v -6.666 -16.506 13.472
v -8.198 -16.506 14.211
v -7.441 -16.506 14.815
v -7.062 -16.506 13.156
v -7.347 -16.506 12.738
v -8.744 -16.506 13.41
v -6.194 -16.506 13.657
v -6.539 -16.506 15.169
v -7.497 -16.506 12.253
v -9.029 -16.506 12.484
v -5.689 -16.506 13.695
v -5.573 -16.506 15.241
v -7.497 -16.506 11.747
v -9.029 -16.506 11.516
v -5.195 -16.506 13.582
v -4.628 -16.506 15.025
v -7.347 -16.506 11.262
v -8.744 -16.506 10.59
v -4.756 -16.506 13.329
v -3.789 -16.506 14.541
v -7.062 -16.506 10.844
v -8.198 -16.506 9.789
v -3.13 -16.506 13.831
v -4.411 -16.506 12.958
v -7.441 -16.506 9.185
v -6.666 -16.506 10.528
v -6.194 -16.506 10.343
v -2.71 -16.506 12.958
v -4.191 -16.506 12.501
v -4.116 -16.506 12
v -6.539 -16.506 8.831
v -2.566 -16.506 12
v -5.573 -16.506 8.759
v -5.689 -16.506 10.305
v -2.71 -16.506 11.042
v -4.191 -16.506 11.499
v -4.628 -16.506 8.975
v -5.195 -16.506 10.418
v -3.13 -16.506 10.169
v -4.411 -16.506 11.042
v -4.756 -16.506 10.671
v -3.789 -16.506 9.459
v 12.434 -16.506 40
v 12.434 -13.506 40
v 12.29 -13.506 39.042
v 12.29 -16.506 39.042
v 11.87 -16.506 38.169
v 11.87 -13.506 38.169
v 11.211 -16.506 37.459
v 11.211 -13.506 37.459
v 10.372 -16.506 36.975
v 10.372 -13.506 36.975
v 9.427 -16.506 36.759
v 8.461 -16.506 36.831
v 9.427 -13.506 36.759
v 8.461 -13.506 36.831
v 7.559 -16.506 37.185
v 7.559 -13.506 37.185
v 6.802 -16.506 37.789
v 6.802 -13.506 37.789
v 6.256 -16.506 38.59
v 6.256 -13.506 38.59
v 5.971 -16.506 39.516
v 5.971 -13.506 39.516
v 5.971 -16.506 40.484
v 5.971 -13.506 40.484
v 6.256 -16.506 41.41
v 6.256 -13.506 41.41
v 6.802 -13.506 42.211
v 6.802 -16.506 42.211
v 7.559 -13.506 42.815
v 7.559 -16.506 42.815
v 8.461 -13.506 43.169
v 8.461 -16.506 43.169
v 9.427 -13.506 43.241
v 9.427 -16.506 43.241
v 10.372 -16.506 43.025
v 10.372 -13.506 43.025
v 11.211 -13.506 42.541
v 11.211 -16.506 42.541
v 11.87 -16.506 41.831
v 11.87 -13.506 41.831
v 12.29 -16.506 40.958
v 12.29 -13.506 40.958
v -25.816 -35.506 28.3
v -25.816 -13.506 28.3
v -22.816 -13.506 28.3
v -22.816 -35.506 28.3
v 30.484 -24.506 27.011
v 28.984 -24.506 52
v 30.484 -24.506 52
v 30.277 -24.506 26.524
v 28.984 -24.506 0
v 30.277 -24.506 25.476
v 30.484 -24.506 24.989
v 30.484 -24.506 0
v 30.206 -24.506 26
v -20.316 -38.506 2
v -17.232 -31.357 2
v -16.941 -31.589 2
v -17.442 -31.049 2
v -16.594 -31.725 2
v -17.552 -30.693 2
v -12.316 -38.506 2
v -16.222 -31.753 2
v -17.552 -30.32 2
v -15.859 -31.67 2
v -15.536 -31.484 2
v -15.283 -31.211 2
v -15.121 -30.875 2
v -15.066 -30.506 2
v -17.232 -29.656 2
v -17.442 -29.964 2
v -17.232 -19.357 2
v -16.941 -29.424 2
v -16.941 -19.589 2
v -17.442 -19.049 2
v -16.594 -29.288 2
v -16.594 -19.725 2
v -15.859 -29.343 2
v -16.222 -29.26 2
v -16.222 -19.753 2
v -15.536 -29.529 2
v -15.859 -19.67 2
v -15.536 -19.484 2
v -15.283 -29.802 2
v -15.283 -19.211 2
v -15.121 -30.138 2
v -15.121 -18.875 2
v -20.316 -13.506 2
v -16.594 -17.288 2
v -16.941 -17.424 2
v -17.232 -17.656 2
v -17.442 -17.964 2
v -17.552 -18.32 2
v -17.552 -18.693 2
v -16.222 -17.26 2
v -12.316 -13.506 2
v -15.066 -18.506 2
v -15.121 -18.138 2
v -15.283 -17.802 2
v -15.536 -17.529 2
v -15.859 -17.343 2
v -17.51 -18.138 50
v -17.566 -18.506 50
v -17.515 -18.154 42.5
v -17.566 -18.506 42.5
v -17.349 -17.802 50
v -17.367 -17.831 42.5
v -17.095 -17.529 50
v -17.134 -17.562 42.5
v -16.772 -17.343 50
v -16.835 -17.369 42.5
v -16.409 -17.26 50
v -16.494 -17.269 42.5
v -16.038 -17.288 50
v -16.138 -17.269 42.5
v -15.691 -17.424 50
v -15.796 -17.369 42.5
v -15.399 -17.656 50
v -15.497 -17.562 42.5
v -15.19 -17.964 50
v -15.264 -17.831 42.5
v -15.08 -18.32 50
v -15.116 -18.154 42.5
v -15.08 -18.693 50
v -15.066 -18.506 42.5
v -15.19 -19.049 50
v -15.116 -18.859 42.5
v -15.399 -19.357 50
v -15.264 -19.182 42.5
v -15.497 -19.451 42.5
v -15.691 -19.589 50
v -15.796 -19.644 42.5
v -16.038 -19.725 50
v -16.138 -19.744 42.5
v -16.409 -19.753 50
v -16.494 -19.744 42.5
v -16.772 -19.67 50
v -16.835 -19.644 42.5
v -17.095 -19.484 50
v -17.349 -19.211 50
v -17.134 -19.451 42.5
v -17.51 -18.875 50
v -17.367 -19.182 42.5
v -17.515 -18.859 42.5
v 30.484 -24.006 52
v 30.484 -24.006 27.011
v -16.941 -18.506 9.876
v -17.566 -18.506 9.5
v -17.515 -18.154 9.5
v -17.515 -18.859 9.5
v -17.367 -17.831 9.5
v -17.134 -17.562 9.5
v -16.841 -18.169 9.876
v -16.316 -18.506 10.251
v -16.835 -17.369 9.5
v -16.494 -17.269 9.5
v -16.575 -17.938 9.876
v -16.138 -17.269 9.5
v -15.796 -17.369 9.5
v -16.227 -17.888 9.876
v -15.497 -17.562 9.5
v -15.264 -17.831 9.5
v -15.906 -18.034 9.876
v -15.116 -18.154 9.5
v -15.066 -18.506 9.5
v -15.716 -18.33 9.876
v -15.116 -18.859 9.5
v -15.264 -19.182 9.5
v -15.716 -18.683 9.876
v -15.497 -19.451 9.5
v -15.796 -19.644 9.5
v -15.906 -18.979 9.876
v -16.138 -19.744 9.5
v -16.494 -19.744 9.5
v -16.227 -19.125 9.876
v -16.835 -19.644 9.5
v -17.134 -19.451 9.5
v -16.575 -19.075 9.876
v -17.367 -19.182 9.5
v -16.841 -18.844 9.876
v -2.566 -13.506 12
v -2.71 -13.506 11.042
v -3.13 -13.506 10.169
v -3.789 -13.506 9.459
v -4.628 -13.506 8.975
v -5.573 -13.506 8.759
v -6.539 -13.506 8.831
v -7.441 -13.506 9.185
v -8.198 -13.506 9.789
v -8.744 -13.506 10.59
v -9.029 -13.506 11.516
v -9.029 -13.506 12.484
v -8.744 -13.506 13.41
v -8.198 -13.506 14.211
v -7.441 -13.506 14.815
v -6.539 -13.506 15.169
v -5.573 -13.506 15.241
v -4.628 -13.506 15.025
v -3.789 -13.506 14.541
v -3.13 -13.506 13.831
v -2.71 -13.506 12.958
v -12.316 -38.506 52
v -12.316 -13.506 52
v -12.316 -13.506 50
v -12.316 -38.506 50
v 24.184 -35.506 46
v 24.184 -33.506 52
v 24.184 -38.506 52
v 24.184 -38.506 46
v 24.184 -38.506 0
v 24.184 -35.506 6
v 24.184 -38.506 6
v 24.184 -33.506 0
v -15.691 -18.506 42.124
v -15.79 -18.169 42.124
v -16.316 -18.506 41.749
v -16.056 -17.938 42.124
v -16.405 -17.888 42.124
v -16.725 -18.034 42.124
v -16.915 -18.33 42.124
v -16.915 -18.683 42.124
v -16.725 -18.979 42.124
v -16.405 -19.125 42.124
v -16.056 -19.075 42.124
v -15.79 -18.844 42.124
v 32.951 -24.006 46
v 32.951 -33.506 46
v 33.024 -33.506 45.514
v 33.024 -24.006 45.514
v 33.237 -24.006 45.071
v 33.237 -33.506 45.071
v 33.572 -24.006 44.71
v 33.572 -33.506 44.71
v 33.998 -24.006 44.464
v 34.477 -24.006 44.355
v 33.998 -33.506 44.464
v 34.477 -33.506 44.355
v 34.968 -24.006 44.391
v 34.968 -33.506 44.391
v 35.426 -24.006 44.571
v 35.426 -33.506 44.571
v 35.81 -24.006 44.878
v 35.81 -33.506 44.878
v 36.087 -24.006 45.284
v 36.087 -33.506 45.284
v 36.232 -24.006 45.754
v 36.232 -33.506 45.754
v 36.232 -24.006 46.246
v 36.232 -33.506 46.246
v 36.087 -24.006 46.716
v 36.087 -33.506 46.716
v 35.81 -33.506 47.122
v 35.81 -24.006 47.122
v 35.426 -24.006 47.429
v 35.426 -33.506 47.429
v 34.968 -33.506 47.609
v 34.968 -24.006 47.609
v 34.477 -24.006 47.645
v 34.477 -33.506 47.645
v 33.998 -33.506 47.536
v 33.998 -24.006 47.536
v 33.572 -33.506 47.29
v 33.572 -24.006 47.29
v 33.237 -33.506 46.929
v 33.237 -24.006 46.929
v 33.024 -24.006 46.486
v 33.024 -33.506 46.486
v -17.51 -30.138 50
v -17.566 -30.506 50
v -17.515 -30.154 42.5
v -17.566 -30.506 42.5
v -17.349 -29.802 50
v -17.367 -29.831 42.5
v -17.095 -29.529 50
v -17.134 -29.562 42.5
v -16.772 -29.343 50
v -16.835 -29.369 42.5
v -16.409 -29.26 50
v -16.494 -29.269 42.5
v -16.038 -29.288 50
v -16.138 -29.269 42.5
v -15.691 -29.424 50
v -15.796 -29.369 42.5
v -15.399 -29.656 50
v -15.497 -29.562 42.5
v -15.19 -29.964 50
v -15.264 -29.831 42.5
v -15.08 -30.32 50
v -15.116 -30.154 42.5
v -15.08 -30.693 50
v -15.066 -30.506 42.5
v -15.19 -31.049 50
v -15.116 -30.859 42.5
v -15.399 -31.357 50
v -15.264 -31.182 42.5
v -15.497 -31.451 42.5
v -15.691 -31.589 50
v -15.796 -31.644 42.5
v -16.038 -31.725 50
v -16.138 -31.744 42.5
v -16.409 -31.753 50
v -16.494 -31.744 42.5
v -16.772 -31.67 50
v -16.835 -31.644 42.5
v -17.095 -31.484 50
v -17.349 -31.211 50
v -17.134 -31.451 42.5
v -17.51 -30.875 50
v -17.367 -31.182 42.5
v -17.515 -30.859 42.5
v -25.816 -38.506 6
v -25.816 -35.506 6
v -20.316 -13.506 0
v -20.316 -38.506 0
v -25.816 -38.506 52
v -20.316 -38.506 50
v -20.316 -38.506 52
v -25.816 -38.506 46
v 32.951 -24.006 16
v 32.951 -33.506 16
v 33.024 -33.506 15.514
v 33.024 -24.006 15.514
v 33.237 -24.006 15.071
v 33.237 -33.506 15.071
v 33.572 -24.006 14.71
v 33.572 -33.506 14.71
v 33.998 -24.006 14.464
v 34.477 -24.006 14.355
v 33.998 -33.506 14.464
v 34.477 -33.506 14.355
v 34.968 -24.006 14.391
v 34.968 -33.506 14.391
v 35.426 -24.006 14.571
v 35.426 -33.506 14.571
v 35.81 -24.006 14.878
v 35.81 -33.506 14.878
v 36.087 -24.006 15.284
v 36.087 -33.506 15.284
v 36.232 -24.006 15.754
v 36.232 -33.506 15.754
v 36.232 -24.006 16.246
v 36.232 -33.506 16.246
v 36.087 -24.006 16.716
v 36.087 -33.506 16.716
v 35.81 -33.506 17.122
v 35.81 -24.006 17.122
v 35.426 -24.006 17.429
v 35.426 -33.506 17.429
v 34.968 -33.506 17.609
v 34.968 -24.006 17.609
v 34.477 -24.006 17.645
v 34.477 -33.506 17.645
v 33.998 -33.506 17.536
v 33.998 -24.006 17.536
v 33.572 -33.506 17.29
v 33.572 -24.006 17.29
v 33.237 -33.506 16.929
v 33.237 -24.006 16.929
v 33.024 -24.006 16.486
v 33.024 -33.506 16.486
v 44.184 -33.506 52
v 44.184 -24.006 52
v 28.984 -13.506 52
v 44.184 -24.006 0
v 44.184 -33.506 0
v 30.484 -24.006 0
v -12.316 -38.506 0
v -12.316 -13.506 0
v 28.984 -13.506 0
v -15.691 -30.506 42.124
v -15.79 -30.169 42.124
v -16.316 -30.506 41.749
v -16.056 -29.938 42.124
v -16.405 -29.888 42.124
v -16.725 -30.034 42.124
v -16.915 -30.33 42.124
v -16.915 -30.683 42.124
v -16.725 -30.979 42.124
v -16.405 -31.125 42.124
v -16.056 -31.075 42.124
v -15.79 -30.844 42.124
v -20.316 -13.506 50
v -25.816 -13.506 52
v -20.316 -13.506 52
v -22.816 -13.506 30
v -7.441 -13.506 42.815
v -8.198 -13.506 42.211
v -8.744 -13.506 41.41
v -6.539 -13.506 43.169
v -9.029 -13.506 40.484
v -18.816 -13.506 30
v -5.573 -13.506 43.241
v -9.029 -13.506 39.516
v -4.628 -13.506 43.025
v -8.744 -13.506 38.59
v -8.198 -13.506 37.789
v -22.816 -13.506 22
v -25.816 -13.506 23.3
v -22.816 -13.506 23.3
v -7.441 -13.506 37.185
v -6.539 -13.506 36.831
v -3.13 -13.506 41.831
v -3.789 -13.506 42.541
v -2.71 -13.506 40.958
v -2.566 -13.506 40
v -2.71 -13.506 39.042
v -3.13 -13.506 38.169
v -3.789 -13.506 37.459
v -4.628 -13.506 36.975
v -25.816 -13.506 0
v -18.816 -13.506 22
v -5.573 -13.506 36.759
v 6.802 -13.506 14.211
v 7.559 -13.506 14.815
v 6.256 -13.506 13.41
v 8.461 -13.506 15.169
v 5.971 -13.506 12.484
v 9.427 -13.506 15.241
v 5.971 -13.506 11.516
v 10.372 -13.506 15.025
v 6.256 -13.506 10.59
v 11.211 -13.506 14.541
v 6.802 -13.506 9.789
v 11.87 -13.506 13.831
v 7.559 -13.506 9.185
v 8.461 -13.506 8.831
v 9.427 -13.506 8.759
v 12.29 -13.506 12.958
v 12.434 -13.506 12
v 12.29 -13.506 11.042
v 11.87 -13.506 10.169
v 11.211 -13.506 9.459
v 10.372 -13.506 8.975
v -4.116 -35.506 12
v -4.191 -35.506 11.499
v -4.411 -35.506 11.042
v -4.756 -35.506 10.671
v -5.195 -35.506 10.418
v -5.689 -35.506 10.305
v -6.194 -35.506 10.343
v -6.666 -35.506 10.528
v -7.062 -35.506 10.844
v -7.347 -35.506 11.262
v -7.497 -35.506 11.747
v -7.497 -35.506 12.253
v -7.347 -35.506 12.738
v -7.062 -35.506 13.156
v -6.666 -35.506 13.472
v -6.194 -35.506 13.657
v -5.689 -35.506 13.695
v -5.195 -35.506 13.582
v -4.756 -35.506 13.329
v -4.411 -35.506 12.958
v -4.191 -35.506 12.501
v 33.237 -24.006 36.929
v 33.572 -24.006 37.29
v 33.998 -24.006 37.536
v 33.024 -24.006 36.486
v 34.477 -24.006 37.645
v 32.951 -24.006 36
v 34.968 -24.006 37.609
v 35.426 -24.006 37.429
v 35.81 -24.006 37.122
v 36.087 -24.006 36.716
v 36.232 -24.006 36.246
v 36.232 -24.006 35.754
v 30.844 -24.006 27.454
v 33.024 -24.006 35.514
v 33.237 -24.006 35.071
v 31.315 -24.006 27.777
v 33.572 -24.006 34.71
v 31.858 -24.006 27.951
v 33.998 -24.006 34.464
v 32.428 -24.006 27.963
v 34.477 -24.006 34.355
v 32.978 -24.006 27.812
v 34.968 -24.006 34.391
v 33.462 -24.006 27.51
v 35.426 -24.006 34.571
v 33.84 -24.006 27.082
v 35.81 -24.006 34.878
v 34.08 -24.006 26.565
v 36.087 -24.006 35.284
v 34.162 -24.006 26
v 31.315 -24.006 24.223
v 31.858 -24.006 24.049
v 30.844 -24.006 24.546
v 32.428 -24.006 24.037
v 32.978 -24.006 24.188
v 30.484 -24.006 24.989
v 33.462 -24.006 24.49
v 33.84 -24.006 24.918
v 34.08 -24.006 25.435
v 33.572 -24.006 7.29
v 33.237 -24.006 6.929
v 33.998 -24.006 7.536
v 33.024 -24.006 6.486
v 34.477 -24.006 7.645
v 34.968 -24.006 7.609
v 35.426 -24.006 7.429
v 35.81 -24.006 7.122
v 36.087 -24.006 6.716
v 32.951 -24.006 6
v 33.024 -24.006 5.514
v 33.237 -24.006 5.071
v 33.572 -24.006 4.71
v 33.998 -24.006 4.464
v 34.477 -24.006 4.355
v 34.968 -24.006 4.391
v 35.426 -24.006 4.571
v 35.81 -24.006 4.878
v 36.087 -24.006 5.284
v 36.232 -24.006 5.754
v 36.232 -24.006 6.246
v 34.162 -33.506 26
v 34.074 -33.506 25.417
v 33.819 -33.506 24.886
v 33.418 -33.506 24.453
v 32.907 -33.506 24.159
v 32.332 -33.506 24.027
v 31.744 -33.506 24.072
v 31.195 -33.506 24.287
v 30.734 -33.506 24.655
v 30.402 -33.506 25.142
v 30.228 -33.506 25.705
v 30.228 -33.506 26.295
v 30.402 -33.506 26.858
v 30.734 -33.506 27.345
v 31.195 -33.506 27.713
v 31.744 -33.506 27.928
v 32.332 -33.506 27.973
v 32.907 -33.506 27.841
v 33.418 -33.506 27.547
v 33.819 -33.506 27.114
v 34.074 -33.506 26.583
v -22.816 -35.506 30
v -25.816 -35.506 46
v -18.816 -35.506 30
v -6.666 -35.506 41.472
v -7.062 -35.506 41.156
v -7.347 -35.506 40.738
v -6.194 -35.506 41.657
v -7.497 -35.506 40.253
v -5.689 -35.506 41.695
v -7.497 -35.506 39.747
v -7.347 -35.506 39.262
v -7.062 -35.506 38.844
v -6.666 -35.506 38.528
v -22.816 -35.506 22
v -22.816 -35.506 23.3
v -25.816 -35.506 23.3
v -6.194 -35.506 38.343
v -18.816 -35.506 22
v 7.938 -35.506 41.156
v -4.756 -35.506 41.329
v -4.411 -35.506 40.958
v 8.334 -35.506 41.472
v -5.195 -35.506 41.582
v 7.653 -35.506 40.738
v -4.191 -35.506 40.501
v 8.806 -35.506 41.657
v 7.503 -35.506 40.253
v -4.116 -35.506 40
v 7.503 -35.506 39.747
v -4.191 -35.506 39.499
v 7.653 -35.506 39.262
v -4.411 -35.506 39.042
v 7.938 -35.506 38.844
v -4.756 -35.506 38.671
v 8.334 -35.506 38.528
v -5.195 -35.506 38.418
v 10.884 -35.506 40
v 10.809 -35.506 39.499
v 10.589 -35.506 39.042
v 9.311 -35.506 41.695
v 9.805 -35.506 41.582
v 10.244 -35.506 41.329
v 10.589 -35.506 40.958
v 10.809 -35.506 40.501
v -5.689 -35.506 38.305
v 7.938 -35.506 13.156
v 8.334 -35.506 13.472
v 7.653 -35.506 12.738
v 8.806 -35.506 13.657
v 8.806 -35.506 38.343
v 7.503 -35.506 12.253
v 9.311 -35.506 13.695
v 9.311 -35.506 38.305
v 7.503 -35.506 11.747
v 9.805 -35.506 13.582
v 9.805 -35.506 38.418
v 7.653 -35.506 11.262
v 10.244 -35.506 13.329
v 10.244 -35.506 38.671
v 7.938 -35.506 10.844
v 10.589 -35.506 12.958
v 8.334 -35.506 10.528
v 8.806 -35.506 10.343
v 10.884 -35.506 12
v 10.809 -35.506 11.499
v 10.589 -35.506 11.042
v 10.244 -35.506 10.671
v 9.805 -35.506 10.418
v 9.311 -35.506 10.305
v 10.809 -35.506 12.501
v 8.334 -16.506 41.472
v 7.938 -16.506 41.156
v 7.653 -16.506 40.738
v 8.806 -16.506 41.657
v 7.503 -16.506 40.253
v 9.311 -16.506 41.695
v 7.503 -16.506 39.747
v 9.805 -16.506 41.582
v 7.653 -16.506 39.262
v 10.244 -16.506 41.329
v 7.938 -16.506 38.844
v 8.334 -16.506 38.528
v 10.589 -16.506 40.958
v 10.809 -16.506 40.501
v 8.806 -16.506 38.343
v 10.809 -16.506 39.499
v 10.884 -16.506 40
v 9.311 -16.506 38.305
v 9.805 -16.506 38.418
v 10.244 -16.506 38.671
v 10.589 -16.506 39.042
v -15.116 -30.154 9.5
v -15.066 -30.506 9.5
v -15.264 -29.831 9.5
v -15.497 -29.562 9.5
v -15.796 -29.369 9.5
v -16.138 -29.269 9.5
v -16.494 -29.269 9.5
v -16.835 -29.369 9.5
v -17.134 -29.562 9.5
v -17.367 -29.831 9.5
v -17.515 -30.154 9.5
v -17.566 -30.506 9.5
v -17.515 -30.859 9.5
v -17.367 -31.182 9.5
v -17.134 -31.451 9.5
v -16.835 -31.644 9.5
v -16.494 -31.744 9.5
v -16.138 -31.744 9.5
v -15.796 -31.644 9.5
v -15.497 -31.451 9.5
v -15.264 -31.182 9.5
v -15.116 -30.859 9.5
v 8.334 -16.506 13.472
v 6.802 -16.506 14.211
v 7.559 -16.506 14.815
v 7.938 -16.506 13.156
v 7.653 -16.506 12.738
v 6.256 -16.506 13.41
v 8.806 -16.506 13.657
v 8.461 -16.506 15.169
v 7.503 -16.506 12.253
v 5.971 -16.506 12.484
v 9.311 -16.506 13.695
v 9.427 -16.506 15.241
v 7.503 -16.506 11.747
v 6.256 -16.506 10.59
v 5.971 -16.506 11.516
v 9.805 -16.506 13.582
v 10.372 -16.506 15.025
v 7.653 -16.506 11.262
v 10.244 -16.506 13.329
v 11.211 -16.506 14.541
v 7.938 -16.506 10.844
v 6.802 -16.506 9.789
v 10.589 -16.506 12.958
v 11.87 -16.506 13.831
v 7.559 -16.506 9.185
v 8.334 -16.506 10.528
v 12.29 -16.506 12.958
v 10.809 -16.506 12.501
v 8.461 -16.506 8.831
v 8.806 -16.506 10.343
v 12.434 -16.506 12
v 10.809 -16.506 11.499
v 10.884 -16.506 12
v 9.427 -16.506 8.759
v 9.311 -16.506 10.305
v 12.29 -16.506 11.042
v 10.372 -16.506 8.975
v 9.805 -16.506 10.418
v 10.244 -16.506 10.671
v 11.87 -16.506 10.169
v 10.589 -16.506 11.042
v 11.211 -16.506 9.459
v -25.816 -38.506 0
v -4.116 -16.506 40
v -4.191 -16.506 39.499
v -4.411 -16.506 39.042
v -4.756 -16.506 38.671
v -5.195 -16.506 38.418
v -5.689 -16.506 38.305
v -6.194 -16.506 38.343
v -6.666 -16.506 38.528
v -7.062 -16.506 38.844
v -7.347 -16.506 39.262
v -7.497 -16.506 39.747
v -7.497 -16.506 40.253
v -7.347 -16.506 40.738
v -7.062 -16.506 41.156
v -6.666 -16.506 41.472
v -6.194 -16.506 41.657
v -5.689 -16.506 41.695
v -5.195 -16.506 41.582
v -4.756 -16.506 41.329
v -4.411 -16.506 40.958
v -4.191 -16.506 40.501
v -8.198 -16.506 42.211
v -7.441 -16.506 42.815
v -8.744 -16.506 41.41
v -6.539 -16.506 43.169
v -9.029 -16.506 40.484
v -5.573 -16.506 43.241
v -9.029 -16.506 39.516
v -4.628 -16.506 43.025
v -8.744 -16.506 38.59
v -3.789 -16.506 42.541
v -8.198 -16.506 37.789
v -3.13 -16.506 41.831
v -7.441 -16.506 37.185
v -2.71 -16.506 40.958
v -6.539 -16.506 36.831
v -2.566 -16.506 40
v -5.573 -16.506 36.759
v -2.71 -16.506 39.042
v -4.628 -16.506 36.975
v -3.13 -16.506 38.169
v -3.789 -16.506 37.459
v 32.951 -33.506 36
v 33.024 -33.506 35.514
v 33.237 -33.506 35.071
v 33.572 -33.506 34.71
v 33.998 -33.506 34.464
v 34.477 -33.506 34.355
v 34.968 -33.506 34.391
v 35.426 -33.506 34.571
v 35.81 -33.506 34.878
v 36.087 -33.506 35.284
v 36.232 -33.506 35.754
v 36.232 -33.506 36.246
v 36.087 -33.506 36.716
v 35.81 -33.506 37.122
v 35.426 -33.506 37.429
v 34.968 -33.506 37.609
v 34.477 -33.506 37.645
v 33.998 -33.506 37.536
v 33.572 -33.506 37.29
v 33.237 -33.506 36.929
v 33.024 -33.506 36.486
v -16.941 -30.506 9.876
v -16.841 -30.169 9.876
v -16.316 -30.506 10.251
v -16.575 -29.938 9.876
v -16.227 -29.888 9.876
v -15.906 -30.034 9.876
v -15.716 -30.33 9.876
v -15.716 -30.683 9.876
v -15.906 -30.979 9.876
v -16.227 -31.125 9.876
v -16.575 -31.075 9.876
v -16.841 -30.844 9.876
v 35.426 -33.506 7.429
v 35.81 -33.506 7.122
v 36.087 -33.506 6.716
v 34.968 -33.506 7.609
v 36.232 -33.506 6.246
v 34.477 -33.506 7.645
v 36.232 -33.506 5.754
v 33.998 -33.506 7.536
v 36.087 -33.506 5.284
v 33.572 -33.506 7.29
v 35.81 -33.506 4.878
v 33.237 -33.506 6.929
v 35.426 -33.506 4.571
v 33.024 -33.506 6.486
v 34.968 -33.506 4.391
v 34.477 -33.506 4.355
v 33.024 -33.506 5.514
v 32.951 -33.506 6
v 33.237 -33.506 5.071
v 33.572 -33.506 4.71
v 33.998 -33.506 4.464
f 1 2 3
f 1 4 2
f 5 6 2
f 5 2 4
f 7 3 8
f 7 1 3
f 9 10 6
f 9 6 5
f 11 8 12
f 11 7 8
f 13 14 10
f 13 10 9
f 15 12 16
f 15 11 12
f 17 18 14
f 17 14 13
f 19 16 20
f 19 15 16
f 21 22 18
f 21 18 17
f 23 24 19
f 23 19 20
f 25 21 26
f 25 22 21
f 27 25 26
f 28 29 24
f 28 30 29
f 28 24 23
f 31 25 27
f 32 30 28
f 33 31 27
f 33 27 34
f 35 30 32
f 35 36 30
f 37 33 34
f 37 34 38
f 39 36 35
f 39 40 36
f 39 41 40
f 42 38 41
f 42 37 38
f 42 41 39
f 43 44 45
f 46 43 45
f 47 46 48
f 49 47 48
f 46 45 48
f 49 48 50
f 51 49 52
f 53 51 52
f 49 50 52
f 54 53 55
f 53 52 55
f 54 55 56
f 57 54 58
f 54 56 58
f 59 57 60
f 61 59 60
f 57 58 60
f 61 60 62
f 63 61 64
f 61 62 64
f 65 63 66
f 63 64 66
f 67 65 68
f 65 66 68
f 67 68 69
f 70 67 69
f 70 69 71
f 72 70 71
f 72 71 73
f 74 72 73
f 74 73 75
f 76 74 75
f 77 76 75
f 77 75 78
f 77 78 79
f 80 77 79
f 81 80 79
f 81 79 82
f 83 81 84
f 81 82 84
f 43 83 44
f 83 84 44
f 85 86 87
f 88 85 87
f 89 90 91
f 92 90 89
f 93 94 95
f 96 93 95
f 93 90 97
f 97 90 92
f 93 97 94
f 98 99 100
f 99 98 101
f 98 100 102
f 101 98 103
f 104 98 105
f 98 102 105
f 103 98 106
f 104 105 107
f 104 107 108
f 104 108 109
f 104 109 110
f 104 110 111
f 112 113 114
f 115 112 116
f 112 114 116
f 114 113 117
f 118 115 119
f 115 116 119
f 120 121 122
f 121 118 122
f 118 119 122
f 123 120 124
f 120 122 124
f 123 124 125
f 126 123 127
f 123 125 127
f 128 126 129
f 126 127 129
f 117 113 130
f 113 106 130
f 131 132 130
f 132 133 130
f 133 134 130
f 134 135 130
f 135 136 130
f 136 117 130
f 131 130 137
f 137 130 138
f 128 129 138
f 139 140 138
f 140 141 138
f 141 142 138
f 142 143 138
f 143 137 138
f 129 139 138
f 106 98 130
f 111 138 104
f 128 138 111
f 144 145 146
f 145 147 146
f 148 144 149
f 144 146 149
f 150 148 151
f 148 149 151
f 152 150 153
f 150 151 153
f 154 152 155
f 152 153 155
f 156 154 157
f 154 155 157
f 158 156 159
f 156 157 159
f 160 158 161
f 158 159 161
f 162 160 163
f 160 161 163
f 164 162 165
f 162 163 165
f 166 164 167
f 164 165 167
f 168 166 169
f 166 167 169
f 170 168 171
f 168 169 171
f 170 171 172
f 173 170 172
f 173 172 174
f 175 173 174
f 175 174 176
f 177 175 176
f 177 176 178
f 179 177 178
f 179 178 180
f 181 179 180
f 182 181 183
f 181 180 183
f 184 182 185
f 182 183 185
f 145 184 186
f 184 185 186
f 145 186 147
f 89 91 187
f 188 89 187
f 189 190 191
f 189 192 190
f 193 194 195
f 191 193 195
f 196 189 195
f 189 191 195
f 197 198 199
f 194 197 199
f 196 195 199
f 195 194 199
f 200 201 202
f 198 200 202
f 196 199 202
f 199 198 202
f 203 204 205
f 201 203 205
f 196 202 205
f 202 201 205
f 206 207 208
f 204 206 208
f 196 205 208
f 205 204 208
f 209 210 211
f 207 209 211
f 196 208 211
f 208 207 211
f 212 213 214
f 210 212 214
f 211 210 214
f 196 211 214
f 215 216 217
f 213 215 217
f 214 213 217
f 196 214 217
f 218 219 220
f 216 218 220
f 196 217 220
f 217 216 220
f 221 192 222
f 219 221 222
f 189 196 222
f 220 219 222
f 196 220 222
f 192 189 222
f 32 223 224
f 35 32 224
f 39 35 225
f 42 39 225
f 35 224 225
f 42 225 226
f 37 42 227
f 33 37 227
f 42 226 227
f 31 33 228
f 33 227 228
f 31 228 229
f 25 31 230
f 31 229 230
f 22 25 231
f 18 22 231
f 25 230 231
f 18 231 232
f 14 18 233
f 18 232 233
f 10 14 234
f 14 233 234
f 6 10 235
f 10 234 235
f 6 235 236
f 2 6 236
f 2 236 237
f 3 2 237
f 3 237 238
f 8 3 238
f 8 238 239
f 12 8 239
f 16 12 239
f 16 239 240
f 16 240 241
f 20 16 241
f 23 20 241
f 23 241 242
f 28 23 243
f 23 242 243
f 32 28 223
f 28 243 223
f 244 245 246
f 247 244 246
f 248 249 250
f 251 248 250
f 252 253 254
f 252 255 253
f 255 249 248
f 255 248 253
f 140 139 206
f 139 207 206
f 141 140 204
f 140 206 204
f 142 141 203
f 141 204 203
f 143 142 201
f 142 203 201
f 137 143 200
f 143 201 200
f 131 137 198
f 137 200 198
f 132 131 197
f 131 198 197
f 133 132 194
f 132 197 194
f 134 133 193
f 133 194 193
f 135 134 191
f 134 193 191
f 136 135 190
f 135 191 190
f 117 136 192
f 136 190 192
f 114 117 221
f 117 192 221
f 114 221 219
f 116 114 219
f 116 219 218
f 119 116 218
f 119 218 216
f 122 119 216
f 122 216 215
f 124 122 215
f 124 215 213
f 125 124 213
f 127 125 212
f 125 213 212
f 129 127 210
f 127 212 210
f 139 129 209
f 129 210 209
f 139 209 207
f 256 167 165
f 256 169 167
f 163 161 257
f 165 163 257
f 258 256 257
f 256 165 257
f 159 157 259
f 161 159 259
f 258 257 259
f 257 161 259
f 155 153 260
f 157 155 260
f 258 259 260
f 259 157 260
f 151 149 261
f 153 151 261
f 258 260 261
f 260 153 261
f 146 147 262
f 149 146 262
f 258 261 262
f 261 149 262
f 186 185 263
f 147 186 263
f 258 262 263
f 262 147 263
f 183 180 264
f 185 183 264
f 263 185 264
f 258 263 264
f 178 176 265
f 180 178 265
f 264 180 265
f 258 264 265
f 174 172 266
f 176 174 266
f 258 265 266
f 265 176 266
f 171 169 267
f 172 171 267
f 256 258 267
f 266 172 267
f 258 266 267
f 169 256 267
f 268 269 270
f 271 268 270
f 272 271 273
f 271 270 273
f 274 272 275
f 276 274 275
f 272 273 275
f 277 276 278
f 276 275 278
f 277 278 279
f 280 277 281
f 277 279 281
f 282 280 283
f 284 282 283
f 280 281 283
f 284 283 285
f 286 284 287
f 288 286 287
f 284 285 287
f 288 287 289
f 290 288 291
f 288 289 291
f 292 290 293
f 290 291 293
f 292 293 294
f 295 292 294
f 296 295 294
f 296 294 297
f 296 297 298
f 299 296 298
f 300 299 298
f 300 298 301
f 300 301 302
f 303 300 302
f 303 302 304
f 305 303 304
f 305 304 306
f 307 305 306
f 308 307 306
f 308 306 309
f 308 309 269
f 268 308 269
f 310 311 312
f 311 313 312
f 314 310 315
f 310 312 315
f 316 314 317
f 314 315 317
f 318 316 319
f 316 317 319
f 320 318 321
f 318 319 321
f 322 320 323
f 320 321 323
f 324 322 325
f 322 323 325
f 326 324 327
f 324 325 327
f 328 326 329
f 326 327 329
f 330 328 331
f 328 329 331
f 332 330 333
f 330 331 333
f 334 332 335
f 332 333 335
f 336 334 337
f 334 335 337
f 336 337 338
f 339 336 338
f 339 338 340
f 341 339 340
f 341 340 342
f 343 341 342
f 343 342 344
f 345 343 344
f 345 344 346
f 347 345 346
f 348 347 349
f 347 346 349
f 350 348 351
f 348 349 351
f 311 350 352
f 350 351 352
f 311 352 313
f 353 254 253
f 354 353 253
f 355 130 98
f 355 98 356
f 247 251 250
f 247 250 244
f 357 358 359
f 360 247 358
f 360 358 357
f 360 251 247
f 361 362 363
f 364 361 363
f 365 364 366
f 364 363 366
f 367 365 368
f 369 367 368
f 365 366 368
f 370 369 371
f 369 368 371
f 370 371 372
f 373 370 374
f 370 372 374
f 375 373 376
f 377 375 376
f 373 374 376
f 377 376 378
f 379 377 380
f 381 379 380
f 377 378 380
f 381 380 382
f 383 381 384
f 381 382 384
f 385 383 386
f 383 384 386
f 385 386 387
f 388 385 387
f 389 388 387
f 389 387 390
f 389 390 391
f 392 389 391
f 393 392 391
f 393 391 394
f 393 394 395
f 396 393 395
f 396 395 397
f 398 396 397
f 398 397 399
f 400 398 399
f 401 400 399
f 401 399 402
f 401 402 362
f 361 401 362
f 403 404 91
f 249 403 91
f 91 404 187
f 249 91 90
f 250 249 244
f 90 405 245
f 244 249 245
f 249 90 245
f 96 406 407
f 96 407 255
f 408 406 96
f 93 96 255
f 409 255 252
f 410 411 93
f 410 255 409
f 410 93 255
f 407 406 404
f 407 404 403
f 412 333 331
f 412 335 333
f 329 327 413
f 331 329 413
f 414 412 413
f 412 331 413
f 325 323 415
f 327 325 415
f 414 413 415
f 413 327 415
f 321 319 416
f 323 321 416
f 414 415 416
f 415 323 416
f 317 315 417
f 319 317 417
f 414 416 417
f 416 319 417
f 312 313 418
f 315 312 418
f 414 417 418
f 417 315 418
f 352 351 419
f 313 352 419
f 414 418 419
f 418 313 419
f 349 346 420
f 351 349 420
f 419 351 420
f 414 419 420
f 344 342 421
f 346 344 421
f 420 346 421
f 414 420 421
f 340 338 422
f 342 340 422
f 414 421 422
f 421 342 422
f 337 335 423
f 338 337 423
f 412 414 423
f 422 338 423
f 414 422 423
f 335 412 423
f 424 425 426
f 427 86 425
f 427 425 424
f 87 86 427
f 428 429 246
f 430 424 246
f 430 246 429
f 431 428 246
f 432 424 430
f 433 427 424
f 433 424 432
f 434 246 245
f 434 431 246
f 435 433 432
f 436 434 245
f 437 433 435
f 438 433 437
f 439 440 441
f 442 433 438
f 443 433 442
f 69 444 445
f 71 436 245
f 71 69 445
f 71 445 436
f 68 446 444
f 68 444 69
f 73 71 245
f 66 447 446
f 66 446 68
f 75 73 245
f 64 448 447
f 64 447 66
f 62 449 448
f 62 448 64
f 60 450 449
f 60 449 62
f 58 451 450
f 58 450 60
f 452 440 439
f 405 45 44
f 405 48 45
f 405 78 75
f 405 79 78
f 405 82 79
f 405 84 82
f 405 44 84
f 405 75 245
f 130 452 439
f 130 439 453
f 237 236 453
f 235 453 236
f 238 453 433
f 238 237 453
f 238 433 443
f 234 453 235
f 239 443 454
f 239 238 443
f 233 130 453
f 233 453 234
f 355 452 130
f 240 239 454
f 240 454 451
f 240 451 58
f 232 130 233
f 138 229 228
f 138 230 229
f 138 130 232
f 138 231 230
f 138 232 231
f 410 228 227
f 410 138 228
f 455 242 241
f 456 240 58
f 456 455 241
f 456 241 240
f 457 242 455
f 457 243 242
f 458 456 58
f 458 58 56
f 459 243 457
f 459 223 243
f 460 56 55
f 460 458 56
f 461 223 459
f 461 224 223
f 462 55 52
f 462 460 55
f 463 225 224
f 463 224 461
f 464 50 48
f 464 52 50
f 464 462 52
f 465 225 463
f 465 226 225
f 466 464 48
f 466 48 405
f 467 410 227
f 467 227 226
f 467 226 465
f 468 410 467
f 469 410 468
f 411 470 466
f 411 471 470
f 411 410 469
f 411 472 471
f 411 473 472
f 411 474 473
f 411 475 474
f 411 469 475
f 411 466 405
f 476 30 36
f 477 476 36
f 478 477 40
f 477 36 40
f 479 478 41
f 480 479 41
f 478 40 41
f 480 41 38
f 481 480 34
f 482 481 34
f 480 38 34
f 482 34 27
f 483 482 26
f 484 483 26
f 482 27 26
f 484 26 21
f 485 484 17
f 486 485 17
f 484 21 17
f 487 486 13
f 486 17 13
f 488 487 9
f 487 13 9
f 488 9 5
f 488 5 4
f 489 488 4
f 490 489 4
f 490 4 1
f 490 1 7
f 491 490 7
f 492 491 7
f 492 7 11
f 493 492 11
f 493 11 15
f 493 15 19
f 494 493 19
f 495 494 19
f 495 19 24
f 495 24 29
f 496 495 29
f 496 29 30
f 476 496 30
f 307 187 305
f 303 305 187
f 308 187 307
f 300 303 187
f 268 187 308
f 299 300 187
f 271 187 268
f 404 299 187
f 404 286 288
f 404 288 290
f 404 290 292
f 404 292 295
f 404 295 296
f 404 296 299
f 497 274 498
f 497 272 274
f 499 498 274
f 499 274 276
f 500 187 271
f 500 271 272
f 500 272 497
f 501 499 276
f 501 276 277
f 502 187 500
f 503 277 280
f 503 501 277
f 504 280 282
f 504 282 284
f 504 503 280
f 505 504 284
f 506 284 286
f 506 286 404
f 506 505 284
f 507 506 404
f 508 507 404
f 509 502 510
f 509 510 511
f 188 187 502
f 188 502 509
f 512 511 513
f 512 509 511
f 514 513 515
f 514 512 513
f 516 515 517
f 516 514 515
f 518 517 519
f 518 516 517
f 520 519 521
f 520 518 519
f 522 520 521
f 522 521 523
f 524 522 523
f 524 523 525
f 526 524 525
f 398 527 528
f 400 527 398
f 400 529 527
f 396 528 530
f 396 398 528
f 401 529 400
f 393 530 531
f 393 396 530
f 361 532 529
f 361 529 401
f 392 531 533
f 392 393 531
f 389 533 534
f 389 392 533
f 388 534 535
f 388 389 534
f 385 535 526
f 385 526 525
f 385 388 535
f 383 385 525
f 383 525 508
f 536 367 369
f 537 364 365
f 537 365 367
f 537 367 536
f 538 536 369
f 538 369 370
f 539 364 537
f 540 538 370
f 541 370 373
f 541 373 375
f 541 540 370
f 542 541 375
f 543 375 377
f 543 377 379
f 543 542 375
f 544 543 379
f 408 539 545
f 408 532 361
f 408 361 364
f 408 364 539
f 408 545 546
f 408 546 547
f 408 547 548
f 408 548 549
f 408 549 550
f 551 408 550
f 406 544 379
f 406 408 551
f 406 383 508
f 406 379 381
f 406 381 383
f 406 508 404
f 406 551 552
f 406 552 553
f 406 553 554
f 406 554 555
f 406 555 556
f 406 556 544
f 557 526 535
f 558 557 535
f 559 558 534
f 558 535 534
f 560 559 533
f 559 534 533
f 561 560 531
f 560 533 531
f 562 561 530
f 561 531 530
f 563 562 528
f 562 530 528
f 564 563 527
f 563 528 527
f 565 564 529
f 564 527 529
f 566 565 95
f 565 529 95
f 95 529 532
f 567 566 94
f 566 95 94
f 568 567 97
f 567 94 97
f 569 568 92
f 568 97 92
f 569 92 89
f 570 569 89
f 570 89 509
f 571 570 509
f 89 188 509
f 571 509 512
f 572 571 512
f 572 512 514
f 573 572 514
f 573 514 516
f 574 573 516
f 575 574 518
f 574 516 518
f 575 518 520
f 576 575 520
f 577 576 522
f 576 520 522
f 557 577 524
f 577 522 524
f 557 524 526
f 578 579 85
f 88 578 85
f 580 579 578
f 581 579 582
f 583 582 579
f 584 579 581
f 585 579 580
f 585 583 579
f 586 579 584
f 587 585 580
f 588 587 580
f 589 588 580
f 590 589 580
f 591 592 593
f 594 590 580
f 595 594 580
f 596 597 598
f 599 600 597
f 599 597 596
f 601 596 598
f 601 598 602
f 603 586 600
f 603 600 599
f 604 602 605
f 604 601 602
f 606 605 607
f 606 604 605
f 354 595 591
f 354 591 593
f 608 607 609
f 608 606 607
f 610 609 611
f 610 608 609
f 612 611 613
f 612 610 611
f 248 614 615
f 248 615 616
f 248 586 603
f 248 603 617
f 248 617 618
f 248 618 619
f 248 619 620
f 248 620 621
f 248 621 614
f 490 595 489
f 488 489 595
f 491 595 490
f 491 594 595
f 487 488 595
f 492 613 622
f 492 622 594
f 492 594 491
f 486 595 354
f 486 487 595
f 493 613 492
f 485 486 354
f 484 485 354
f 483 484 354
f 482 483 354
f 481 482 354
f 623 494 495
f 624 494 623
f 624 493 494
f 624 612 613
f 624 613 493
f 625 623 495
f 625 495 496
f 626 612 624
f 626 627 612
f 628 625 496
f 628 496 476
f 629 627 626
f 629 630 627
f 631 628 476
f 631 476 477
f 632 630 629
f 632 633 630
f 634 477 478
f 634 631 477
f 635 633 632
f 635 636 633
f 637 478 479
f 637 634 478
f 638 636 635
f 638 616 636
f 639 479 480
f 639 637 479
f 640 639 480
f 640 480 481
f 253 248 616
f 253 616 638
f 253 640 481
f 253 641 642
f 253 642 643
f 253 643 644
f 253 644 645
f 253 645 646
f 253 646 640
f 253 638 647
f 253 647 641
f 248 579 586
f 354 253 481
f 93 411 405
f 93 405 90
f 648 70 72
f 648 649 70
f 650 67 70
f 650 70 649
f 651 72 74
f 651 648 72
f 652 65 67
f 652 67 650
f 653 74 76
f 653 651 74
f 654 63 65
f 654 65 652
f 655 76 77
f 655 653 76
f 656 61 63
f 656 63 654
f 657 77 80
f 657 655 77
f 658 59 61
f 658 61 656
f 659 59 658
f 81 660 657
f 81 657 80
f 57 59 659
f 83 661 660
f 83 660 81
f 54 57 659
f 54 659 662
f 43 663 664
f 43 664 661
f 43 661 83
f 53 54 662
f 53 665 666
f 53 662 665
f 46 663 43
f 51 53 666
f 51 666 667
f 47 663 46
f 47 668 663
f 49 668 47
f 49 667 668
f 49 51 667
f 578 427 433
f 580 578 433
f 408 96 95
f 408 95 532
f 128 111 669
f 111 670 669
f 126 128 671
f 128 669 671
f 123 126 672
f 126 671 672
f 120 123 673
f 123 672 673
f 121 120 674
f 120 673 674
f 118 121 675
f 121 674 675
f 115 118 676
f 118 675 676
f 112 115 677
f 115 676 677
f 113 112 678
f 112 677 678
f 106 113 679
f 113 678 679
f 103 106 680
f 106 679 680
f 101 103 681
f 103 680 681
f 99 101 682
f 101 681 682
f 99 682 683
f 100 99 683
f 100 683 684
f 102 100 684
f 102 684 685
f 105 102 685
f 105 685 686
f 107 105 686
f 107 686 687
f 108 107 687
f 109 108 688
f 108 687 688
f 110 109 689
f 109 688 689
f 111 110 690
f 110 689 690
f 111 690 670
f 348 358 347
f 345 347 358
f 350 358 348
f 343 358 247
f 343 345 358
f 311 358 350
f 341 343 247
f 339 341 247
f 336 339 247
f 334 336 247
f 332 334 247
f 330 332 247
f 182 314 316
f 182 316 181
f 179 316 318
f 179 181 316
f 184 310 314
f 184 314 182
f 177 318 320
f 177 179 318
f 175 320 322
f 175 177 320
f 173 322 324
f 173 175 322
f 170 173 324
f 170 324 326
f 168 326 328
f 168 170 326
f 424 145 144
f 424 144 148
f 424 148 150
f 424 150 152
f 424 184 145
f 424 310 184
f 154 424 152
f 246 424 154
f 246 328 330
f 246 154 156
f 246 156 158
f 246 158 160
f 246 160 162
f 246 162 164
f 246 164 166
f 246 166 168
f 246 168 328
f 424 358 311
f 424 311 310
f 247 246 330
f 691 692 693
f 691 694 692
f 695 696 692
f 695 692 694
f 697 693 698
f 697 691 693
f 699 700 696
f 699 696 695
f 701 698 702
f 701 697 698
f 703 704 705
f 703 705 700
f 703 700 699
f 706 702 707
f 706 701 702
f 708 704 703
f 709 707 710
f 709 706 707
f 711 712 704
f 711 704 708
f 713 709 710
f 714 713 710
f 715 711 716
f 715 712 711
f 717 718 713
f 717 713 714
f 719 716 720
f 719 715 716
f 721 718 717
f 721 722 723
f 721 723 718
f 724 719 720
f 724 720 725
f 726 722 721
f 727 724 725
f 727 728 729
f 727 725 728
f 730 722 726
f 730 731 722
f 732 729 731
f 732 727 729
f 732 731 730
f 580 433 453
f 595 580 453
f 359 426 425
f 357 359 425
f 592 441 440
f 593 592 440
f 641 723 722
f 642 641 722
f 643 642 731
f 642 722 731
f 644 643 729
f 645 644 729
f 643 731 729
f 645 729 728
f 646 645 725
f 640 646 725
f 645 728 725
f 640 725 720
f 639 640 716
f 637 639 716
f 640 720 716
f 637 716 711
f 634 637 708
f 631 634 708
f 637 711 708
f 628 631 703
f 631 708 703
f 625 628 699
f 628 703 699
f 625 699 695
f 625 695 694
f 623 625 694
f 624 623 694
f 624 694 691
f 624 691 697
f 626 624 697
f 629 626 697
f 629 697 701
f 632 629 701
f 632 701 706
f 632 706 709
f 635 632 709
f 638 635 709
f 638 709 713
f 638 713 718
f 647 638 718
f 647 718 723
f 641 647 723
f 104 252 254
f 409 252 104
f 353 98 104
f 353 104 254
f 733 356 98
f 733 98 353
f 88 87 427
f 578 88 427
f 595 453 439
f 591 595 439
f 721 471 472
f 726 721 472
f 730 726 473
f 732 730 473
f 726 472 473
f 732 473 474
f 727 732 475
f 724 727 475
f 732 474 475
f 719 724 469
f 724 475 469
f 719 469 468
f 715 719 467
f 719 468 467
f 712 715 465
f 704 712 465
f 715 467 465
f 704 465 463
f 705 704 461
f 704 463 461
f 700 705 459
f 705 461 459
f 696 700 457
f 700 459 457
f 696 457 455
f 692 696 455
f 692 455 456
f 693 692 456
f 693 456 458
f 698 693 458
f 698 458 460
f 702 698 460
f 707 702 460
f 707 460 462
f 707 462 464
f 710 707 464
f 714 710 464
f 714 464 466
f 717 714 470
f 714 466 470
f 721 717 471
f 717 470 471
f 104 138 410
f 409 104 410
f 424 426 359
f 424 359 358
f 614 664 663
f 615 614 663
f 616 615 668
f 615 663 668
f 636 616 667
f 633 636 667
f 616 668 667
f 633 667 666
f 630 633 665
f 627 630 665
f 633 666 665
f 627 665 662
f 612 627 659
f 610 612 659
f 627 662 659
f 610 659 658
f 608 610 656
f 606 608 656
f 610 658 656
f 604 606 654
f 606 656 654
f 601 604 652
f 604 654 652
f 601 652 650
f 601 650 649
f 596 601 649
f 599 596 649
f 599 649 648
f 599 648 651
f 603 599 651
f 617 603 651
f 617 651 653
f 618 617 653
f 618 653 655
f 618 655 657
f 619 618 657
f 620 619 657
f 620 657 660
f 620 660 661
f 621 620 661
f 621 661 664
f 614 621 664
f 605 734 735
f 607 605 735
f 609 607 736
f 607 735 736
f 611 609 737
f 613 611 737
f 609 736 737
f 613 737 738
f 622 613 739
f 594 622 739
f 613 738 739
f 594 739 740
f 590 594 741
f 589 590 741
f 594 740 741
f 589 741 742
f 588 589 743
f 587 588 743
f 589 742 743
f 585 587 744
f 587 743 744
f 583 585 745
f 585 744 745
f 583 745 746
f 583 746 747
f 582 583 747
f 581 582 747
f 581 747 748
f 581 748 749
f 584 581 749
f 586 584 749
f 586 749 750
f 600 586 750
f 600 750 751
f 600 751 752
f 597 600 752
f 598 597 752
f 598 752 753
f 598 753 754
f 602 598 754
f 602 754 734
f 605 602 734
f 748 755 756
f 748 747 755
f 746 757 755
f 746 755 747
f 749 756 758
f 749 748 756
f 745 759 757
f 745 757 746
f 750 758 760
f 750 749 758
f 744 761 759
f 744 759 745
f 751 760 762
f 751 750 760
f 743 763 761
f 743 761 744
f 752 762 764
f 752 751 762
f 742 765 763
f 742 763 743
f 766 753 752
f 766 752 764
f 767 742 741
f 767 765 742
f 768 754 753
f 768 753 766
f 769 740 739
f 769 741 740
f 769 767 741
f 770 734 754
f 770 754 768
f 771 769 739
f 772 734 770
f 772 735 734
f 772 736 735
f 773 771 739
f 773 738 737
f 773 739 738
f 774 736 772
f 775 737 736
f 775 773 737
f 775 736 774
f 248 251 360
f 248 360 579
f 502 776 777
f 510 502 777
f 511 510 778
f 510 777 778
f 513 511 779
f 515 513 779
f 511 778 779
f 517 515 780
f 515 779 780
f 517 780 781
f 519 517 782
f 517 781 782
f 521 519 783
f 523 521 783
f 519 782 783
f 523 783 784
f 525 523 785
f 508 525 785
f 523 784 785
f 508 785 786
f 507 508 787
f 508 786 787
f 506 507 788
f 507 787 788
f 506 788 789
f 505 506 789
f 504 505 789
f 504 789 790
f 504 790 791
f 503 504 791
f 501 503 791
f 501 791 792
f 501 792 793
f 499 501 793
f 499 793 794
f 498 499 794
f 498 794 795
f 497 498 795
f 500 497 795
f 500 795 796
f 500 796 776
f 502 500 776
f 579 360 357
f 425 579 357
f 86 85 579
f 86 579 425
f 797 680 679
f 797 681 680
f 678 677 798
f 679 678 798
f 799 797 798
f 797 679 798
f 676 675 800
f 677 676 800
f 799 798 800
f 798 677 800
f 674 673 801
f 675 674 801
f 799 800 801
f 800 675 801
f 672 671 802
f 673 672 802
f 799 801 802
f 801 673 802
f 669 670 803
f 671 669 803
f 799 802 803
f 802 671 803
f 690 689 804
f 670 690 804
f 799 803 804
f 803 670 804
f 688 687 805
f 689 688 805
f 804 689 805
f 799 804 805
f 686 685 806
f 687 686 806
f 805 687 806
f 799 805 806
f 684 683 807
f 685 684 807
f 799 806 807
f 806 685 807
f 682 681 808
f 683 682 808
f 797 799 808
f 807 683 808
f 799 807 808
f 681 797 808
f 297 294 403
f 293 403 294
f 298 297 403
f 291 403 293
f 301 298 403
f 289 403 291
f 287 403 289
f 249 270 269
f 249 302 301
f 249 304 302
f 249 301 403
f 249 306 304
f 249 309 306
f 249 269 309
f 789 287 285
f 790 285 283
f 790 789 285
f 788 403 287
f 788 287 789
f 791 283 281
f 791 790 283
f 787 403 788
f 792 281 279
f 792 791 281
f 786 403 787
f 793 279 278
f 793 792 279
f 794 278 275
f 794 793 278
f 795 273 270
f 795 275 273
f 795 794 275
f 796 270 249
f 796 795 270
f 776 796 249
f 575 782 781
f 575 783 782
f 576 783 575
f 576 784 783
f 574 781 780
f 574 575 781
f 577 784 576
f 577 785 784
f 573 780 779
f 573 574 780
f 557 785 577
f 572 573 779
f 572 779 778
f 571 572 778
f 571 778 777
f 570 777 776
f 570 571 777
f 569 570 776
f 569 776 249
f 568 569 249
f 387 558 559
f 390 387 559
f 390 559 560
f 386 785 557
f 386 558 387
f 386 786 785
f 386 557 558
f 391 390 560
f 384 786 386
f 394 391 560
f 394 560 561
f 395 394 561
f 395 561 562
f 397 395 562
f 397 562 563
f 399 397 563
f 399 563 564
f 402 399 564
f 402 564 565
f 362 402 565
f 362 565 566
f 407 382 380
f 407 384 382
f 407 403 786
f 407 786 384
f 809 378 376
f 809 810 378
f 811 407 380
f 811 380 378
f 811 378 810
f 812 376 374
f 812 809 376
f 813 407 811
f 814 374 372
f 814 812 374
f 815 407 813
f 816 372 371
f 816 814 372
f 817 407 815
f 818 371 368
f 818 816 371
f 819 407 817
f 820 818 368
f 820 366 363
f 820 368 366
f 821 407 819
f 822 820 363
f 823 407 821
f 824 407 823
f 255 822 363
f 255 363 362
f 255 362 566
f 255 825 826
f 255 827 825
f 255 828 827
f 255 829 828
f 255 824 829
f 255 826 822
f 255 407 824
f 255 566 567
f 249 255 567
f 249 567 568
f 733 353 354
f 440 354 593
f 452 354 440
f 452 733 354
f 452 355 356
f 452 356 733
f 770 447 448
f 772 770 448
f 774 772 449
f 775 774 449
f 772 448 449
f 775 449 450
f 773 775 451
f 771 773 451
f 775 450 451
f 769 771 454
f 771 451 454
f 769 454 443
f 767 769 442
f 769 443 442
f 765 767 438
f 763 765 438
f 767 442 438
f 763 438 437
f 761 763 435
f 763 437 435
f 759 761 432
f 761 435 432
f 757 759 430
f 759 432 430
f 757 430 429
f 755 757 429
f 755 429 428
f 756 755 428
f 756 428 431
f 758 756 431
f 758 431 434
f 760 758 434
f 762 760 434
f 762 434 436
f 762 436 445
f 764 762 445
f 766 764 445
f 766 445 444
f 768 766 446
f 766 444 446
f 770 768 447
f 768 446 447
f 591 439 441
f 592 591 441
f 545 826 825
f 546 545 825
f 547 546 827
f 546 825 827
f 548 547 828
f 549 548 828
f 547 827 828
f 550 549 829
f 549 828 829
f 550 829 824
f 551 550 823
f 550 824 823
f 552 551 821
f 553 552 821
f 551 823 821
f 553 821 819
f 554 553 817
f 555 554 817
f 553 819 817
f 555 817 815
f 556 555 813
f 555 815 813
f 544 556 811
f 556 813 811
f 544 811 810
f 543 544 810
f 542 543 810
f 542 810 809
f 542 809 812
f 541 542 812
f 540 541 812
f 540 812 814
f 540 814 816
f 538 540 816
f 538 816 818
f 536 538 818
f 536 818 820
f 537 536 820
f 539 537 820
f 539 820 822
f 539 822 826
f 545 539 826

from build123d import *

# Parameters (mm, degrees)
BOSS_EXTRUDE1_DEPTH   = 52
SKETCH2_R             = 1.7
SKETCH2_W             = 8
SKETCH2_H             = 2
CUT_EXTRUDE1_DEPTH    = 52
SKETCH3_R             = 3.25
CUT_EXTRUDE2_DEPTH    = 3
SKETCH4_R             = 1.9780711
CUT_EXTRUDE3_DEPTH    = 15.5
M4_TAPPED_HOLE1_D     = 3.3
M4_TAPPED_HOLE1_DEPTH = 10.1
M4_TAPPED_HOLE1_TIP   = 0.991420021
SKETCH7_W             = 40
SKETCH7_H             = 3
CUT_EXTRUDE4_DEPTH    = 51
M3_TAPPED_HOLE1_D     = 2.5
M3_TAPPED_HOLE1_DEPTH = 7.5
M3_TAPPED_HOLE1_TIP   = 0.751075774
M3_TAPPED_HOLE2_D     = 2.5
M3_TAPPED_HOLE2_DEPTH = 7.5
M3_TAPPED_HOLE2_TIP   = 0.751075774


with BuildPart() as part:
    # Sketch1 → Boss-Extrude1 (new body)
    with BuildSketch(Plane.XY):
        Polygon((-25.815712776, -13.506468073), (28.984287224, -13.506468073), (28.984287224, -24.506468073), (30.484287224, -24.506468073), (30.484287224, -24.006468073), (44.184287224, -24.006468073), (44.184287224, -33.506468073), (24.184287224, -33.506468073), (24.184287224, -38.506468073), (-25.815712776, -38.506468073), align=None)
    extrude(amount=BOSS_EXTRUDE1_DEPTH)

    # Sketch2 → Cut-Extrude1 (cut)
    with BuildSketch(Plane(origin=(0, -13.506468073, 0), x_dir=(1, 0, 0), z_dir=(0, 1, 0))):
        with Locations((-5.815712776, -12)):
            Circle(SKETCH2_R)
        with Locations((9.184287224, -12)):
            Circle(SKETCH2_R)
        with Locations((-5.815712776, -40)):
            Circle(SKETCH2_R)
        with Locations((9.184287224, -40)):
            Circle(SKETCH2_R)
        with Locations((-16.315712776, -51)):
            Rectangle(SKETCH2_W, SKETCH2_H)
        with Locations((-16.315712776, -1)):
            Rectangle(SKETCH2_W, SKETCH2_H)
        Polygon((-22.815712776, -23.3), (-25.815712776, -23.3), (-25.815712776, -28.3), (-22.815712776, -28.3), (-22.815712776, -30), (-18.815712776, -30), (-18.815712776, -22), (-22.815712776, -22), align=None)
    extrude(amount=-CUT_EXTRUDE1_DEPTH, mode=Mode.SUBTRACT)

    # Sketch3 → Cut-Extrude2 (cut)
    with BuildSketch(Plane(origin=(0, -13.506468073, 0), x_dir=(1, 0, 0), z_dir=(0, 1, 0))):
        with Locations((-5.815712776, -12)):
            Circle(SKETCH3_R)
        with Locations((9.184287224, -12)):
            Circle(SKETCH3_R)
        with Locations((9.184287224, -40)):
            Circle(SKETCH3_R)
        with Locations((-5.815712776, -40)):
            Circle(SKETCH3_R)
    extrude(amount=-CUT_EXTRUDE2_DEPTH, mode=Mode.SUBTRACT)

    # Sketch4 → Cut-Extrude3 (cut, through all)
    with BuildSketch(Plane(origin=(0, -24.006468073, 0), x_dir=(1, 0, 0), z_dir=(0, 1, 0))):
        with Locations((32.184287224, -26)):
            Circle(SKETCH4_R)
    extrude(amount=-CUT_EXTRUDE3_DEPTH, mode=Mode.SUBTRACT)

    # M4 Tapped Hole1
    with Locations(Plane(origin=(0, -24.006468073, 0), x_dir=(1, 0, 0), z_dir=(0, 1, 0))):
        with Locations((34.600682557, -6), (34.600682557, -16), (34.600682557, -36), (34.600682557, -46)):
            Hole(M4_TAPPED_HOLE1_D / 2, depth=M4_TAPPED_HOLE1_DEPTH)
            with Locations((0, 0, -(M4_TAPPED_HOLE1_DEPTH + M4_TAPPED_HOLE1_TIP / 2))):  # 118° drill point
                Cone(0, M4_TAPPED_HOLE1_D / 2, M4_TAPPED_HOLE1_TIP, mode=Mode.SUBTRACT)

    # Sketch7 → Cut-Extrude4 (cut, through all)
    with BuildSketch(Plane(origin=(24.184287224, 0, 0), x_dir=(0, 0, -1), z_dir=(1, 0, 0))):
        with Locations((-26, -37.006468073)):
            Rectangle(SKETCH7_W, SKETCH7_H)
    extrude(amount=-CUT_EXTRUDE4_DEPTH, mode=Mode.SUBTRACT)

    # M3 Tapped Hole1
    with Locations(Plane.XY.offset(50)):
        with Locations((-16.315712776, -18.506468073), (-16.315712776, -30.506468073)):
            Hole(M3_TAPPED_HOLE1_D / 2, depth=M3_TAPPED_HOLE1_DEPTH)
            with Locations((0, 0, -(M3_TAPPED_HOLE1_DEPTH + M3_TAPPED_HOLE1_TIP / 2))):  # 118° drill point
                Cone(0, M3_TAPPED_HOLE1_D / 2, M3_TAPPED_HOLE1_TIP, mode=Mode.SUBTRACT)

    # M3 Tapped Hole2
    with Locations(Plane(origin=(0, 0, 2), x_dir=(-1, 0, 0), z_dir=(0, 0, -1))):
        with Locations((16.315712776, -18.506468073), (16.315712776, -30.506468073)):
            Hole(M3_TAPPED_HOLE2_D / 2, depth=M3_TAPPED_HOLE2_DEPTH)
            with Locations((0, 0, -(M3_TAPPED_HOLE2_DEPTH + M3_TAPPED_HOLE2_TIP / 2))):  # 118° drill point
                Cone(0, M3_TAPPED_HOLE2_D / 2, M3_TAPPED_HOLE2_TIP, mode=Mode.SUBTRACT)


solid = part.part
